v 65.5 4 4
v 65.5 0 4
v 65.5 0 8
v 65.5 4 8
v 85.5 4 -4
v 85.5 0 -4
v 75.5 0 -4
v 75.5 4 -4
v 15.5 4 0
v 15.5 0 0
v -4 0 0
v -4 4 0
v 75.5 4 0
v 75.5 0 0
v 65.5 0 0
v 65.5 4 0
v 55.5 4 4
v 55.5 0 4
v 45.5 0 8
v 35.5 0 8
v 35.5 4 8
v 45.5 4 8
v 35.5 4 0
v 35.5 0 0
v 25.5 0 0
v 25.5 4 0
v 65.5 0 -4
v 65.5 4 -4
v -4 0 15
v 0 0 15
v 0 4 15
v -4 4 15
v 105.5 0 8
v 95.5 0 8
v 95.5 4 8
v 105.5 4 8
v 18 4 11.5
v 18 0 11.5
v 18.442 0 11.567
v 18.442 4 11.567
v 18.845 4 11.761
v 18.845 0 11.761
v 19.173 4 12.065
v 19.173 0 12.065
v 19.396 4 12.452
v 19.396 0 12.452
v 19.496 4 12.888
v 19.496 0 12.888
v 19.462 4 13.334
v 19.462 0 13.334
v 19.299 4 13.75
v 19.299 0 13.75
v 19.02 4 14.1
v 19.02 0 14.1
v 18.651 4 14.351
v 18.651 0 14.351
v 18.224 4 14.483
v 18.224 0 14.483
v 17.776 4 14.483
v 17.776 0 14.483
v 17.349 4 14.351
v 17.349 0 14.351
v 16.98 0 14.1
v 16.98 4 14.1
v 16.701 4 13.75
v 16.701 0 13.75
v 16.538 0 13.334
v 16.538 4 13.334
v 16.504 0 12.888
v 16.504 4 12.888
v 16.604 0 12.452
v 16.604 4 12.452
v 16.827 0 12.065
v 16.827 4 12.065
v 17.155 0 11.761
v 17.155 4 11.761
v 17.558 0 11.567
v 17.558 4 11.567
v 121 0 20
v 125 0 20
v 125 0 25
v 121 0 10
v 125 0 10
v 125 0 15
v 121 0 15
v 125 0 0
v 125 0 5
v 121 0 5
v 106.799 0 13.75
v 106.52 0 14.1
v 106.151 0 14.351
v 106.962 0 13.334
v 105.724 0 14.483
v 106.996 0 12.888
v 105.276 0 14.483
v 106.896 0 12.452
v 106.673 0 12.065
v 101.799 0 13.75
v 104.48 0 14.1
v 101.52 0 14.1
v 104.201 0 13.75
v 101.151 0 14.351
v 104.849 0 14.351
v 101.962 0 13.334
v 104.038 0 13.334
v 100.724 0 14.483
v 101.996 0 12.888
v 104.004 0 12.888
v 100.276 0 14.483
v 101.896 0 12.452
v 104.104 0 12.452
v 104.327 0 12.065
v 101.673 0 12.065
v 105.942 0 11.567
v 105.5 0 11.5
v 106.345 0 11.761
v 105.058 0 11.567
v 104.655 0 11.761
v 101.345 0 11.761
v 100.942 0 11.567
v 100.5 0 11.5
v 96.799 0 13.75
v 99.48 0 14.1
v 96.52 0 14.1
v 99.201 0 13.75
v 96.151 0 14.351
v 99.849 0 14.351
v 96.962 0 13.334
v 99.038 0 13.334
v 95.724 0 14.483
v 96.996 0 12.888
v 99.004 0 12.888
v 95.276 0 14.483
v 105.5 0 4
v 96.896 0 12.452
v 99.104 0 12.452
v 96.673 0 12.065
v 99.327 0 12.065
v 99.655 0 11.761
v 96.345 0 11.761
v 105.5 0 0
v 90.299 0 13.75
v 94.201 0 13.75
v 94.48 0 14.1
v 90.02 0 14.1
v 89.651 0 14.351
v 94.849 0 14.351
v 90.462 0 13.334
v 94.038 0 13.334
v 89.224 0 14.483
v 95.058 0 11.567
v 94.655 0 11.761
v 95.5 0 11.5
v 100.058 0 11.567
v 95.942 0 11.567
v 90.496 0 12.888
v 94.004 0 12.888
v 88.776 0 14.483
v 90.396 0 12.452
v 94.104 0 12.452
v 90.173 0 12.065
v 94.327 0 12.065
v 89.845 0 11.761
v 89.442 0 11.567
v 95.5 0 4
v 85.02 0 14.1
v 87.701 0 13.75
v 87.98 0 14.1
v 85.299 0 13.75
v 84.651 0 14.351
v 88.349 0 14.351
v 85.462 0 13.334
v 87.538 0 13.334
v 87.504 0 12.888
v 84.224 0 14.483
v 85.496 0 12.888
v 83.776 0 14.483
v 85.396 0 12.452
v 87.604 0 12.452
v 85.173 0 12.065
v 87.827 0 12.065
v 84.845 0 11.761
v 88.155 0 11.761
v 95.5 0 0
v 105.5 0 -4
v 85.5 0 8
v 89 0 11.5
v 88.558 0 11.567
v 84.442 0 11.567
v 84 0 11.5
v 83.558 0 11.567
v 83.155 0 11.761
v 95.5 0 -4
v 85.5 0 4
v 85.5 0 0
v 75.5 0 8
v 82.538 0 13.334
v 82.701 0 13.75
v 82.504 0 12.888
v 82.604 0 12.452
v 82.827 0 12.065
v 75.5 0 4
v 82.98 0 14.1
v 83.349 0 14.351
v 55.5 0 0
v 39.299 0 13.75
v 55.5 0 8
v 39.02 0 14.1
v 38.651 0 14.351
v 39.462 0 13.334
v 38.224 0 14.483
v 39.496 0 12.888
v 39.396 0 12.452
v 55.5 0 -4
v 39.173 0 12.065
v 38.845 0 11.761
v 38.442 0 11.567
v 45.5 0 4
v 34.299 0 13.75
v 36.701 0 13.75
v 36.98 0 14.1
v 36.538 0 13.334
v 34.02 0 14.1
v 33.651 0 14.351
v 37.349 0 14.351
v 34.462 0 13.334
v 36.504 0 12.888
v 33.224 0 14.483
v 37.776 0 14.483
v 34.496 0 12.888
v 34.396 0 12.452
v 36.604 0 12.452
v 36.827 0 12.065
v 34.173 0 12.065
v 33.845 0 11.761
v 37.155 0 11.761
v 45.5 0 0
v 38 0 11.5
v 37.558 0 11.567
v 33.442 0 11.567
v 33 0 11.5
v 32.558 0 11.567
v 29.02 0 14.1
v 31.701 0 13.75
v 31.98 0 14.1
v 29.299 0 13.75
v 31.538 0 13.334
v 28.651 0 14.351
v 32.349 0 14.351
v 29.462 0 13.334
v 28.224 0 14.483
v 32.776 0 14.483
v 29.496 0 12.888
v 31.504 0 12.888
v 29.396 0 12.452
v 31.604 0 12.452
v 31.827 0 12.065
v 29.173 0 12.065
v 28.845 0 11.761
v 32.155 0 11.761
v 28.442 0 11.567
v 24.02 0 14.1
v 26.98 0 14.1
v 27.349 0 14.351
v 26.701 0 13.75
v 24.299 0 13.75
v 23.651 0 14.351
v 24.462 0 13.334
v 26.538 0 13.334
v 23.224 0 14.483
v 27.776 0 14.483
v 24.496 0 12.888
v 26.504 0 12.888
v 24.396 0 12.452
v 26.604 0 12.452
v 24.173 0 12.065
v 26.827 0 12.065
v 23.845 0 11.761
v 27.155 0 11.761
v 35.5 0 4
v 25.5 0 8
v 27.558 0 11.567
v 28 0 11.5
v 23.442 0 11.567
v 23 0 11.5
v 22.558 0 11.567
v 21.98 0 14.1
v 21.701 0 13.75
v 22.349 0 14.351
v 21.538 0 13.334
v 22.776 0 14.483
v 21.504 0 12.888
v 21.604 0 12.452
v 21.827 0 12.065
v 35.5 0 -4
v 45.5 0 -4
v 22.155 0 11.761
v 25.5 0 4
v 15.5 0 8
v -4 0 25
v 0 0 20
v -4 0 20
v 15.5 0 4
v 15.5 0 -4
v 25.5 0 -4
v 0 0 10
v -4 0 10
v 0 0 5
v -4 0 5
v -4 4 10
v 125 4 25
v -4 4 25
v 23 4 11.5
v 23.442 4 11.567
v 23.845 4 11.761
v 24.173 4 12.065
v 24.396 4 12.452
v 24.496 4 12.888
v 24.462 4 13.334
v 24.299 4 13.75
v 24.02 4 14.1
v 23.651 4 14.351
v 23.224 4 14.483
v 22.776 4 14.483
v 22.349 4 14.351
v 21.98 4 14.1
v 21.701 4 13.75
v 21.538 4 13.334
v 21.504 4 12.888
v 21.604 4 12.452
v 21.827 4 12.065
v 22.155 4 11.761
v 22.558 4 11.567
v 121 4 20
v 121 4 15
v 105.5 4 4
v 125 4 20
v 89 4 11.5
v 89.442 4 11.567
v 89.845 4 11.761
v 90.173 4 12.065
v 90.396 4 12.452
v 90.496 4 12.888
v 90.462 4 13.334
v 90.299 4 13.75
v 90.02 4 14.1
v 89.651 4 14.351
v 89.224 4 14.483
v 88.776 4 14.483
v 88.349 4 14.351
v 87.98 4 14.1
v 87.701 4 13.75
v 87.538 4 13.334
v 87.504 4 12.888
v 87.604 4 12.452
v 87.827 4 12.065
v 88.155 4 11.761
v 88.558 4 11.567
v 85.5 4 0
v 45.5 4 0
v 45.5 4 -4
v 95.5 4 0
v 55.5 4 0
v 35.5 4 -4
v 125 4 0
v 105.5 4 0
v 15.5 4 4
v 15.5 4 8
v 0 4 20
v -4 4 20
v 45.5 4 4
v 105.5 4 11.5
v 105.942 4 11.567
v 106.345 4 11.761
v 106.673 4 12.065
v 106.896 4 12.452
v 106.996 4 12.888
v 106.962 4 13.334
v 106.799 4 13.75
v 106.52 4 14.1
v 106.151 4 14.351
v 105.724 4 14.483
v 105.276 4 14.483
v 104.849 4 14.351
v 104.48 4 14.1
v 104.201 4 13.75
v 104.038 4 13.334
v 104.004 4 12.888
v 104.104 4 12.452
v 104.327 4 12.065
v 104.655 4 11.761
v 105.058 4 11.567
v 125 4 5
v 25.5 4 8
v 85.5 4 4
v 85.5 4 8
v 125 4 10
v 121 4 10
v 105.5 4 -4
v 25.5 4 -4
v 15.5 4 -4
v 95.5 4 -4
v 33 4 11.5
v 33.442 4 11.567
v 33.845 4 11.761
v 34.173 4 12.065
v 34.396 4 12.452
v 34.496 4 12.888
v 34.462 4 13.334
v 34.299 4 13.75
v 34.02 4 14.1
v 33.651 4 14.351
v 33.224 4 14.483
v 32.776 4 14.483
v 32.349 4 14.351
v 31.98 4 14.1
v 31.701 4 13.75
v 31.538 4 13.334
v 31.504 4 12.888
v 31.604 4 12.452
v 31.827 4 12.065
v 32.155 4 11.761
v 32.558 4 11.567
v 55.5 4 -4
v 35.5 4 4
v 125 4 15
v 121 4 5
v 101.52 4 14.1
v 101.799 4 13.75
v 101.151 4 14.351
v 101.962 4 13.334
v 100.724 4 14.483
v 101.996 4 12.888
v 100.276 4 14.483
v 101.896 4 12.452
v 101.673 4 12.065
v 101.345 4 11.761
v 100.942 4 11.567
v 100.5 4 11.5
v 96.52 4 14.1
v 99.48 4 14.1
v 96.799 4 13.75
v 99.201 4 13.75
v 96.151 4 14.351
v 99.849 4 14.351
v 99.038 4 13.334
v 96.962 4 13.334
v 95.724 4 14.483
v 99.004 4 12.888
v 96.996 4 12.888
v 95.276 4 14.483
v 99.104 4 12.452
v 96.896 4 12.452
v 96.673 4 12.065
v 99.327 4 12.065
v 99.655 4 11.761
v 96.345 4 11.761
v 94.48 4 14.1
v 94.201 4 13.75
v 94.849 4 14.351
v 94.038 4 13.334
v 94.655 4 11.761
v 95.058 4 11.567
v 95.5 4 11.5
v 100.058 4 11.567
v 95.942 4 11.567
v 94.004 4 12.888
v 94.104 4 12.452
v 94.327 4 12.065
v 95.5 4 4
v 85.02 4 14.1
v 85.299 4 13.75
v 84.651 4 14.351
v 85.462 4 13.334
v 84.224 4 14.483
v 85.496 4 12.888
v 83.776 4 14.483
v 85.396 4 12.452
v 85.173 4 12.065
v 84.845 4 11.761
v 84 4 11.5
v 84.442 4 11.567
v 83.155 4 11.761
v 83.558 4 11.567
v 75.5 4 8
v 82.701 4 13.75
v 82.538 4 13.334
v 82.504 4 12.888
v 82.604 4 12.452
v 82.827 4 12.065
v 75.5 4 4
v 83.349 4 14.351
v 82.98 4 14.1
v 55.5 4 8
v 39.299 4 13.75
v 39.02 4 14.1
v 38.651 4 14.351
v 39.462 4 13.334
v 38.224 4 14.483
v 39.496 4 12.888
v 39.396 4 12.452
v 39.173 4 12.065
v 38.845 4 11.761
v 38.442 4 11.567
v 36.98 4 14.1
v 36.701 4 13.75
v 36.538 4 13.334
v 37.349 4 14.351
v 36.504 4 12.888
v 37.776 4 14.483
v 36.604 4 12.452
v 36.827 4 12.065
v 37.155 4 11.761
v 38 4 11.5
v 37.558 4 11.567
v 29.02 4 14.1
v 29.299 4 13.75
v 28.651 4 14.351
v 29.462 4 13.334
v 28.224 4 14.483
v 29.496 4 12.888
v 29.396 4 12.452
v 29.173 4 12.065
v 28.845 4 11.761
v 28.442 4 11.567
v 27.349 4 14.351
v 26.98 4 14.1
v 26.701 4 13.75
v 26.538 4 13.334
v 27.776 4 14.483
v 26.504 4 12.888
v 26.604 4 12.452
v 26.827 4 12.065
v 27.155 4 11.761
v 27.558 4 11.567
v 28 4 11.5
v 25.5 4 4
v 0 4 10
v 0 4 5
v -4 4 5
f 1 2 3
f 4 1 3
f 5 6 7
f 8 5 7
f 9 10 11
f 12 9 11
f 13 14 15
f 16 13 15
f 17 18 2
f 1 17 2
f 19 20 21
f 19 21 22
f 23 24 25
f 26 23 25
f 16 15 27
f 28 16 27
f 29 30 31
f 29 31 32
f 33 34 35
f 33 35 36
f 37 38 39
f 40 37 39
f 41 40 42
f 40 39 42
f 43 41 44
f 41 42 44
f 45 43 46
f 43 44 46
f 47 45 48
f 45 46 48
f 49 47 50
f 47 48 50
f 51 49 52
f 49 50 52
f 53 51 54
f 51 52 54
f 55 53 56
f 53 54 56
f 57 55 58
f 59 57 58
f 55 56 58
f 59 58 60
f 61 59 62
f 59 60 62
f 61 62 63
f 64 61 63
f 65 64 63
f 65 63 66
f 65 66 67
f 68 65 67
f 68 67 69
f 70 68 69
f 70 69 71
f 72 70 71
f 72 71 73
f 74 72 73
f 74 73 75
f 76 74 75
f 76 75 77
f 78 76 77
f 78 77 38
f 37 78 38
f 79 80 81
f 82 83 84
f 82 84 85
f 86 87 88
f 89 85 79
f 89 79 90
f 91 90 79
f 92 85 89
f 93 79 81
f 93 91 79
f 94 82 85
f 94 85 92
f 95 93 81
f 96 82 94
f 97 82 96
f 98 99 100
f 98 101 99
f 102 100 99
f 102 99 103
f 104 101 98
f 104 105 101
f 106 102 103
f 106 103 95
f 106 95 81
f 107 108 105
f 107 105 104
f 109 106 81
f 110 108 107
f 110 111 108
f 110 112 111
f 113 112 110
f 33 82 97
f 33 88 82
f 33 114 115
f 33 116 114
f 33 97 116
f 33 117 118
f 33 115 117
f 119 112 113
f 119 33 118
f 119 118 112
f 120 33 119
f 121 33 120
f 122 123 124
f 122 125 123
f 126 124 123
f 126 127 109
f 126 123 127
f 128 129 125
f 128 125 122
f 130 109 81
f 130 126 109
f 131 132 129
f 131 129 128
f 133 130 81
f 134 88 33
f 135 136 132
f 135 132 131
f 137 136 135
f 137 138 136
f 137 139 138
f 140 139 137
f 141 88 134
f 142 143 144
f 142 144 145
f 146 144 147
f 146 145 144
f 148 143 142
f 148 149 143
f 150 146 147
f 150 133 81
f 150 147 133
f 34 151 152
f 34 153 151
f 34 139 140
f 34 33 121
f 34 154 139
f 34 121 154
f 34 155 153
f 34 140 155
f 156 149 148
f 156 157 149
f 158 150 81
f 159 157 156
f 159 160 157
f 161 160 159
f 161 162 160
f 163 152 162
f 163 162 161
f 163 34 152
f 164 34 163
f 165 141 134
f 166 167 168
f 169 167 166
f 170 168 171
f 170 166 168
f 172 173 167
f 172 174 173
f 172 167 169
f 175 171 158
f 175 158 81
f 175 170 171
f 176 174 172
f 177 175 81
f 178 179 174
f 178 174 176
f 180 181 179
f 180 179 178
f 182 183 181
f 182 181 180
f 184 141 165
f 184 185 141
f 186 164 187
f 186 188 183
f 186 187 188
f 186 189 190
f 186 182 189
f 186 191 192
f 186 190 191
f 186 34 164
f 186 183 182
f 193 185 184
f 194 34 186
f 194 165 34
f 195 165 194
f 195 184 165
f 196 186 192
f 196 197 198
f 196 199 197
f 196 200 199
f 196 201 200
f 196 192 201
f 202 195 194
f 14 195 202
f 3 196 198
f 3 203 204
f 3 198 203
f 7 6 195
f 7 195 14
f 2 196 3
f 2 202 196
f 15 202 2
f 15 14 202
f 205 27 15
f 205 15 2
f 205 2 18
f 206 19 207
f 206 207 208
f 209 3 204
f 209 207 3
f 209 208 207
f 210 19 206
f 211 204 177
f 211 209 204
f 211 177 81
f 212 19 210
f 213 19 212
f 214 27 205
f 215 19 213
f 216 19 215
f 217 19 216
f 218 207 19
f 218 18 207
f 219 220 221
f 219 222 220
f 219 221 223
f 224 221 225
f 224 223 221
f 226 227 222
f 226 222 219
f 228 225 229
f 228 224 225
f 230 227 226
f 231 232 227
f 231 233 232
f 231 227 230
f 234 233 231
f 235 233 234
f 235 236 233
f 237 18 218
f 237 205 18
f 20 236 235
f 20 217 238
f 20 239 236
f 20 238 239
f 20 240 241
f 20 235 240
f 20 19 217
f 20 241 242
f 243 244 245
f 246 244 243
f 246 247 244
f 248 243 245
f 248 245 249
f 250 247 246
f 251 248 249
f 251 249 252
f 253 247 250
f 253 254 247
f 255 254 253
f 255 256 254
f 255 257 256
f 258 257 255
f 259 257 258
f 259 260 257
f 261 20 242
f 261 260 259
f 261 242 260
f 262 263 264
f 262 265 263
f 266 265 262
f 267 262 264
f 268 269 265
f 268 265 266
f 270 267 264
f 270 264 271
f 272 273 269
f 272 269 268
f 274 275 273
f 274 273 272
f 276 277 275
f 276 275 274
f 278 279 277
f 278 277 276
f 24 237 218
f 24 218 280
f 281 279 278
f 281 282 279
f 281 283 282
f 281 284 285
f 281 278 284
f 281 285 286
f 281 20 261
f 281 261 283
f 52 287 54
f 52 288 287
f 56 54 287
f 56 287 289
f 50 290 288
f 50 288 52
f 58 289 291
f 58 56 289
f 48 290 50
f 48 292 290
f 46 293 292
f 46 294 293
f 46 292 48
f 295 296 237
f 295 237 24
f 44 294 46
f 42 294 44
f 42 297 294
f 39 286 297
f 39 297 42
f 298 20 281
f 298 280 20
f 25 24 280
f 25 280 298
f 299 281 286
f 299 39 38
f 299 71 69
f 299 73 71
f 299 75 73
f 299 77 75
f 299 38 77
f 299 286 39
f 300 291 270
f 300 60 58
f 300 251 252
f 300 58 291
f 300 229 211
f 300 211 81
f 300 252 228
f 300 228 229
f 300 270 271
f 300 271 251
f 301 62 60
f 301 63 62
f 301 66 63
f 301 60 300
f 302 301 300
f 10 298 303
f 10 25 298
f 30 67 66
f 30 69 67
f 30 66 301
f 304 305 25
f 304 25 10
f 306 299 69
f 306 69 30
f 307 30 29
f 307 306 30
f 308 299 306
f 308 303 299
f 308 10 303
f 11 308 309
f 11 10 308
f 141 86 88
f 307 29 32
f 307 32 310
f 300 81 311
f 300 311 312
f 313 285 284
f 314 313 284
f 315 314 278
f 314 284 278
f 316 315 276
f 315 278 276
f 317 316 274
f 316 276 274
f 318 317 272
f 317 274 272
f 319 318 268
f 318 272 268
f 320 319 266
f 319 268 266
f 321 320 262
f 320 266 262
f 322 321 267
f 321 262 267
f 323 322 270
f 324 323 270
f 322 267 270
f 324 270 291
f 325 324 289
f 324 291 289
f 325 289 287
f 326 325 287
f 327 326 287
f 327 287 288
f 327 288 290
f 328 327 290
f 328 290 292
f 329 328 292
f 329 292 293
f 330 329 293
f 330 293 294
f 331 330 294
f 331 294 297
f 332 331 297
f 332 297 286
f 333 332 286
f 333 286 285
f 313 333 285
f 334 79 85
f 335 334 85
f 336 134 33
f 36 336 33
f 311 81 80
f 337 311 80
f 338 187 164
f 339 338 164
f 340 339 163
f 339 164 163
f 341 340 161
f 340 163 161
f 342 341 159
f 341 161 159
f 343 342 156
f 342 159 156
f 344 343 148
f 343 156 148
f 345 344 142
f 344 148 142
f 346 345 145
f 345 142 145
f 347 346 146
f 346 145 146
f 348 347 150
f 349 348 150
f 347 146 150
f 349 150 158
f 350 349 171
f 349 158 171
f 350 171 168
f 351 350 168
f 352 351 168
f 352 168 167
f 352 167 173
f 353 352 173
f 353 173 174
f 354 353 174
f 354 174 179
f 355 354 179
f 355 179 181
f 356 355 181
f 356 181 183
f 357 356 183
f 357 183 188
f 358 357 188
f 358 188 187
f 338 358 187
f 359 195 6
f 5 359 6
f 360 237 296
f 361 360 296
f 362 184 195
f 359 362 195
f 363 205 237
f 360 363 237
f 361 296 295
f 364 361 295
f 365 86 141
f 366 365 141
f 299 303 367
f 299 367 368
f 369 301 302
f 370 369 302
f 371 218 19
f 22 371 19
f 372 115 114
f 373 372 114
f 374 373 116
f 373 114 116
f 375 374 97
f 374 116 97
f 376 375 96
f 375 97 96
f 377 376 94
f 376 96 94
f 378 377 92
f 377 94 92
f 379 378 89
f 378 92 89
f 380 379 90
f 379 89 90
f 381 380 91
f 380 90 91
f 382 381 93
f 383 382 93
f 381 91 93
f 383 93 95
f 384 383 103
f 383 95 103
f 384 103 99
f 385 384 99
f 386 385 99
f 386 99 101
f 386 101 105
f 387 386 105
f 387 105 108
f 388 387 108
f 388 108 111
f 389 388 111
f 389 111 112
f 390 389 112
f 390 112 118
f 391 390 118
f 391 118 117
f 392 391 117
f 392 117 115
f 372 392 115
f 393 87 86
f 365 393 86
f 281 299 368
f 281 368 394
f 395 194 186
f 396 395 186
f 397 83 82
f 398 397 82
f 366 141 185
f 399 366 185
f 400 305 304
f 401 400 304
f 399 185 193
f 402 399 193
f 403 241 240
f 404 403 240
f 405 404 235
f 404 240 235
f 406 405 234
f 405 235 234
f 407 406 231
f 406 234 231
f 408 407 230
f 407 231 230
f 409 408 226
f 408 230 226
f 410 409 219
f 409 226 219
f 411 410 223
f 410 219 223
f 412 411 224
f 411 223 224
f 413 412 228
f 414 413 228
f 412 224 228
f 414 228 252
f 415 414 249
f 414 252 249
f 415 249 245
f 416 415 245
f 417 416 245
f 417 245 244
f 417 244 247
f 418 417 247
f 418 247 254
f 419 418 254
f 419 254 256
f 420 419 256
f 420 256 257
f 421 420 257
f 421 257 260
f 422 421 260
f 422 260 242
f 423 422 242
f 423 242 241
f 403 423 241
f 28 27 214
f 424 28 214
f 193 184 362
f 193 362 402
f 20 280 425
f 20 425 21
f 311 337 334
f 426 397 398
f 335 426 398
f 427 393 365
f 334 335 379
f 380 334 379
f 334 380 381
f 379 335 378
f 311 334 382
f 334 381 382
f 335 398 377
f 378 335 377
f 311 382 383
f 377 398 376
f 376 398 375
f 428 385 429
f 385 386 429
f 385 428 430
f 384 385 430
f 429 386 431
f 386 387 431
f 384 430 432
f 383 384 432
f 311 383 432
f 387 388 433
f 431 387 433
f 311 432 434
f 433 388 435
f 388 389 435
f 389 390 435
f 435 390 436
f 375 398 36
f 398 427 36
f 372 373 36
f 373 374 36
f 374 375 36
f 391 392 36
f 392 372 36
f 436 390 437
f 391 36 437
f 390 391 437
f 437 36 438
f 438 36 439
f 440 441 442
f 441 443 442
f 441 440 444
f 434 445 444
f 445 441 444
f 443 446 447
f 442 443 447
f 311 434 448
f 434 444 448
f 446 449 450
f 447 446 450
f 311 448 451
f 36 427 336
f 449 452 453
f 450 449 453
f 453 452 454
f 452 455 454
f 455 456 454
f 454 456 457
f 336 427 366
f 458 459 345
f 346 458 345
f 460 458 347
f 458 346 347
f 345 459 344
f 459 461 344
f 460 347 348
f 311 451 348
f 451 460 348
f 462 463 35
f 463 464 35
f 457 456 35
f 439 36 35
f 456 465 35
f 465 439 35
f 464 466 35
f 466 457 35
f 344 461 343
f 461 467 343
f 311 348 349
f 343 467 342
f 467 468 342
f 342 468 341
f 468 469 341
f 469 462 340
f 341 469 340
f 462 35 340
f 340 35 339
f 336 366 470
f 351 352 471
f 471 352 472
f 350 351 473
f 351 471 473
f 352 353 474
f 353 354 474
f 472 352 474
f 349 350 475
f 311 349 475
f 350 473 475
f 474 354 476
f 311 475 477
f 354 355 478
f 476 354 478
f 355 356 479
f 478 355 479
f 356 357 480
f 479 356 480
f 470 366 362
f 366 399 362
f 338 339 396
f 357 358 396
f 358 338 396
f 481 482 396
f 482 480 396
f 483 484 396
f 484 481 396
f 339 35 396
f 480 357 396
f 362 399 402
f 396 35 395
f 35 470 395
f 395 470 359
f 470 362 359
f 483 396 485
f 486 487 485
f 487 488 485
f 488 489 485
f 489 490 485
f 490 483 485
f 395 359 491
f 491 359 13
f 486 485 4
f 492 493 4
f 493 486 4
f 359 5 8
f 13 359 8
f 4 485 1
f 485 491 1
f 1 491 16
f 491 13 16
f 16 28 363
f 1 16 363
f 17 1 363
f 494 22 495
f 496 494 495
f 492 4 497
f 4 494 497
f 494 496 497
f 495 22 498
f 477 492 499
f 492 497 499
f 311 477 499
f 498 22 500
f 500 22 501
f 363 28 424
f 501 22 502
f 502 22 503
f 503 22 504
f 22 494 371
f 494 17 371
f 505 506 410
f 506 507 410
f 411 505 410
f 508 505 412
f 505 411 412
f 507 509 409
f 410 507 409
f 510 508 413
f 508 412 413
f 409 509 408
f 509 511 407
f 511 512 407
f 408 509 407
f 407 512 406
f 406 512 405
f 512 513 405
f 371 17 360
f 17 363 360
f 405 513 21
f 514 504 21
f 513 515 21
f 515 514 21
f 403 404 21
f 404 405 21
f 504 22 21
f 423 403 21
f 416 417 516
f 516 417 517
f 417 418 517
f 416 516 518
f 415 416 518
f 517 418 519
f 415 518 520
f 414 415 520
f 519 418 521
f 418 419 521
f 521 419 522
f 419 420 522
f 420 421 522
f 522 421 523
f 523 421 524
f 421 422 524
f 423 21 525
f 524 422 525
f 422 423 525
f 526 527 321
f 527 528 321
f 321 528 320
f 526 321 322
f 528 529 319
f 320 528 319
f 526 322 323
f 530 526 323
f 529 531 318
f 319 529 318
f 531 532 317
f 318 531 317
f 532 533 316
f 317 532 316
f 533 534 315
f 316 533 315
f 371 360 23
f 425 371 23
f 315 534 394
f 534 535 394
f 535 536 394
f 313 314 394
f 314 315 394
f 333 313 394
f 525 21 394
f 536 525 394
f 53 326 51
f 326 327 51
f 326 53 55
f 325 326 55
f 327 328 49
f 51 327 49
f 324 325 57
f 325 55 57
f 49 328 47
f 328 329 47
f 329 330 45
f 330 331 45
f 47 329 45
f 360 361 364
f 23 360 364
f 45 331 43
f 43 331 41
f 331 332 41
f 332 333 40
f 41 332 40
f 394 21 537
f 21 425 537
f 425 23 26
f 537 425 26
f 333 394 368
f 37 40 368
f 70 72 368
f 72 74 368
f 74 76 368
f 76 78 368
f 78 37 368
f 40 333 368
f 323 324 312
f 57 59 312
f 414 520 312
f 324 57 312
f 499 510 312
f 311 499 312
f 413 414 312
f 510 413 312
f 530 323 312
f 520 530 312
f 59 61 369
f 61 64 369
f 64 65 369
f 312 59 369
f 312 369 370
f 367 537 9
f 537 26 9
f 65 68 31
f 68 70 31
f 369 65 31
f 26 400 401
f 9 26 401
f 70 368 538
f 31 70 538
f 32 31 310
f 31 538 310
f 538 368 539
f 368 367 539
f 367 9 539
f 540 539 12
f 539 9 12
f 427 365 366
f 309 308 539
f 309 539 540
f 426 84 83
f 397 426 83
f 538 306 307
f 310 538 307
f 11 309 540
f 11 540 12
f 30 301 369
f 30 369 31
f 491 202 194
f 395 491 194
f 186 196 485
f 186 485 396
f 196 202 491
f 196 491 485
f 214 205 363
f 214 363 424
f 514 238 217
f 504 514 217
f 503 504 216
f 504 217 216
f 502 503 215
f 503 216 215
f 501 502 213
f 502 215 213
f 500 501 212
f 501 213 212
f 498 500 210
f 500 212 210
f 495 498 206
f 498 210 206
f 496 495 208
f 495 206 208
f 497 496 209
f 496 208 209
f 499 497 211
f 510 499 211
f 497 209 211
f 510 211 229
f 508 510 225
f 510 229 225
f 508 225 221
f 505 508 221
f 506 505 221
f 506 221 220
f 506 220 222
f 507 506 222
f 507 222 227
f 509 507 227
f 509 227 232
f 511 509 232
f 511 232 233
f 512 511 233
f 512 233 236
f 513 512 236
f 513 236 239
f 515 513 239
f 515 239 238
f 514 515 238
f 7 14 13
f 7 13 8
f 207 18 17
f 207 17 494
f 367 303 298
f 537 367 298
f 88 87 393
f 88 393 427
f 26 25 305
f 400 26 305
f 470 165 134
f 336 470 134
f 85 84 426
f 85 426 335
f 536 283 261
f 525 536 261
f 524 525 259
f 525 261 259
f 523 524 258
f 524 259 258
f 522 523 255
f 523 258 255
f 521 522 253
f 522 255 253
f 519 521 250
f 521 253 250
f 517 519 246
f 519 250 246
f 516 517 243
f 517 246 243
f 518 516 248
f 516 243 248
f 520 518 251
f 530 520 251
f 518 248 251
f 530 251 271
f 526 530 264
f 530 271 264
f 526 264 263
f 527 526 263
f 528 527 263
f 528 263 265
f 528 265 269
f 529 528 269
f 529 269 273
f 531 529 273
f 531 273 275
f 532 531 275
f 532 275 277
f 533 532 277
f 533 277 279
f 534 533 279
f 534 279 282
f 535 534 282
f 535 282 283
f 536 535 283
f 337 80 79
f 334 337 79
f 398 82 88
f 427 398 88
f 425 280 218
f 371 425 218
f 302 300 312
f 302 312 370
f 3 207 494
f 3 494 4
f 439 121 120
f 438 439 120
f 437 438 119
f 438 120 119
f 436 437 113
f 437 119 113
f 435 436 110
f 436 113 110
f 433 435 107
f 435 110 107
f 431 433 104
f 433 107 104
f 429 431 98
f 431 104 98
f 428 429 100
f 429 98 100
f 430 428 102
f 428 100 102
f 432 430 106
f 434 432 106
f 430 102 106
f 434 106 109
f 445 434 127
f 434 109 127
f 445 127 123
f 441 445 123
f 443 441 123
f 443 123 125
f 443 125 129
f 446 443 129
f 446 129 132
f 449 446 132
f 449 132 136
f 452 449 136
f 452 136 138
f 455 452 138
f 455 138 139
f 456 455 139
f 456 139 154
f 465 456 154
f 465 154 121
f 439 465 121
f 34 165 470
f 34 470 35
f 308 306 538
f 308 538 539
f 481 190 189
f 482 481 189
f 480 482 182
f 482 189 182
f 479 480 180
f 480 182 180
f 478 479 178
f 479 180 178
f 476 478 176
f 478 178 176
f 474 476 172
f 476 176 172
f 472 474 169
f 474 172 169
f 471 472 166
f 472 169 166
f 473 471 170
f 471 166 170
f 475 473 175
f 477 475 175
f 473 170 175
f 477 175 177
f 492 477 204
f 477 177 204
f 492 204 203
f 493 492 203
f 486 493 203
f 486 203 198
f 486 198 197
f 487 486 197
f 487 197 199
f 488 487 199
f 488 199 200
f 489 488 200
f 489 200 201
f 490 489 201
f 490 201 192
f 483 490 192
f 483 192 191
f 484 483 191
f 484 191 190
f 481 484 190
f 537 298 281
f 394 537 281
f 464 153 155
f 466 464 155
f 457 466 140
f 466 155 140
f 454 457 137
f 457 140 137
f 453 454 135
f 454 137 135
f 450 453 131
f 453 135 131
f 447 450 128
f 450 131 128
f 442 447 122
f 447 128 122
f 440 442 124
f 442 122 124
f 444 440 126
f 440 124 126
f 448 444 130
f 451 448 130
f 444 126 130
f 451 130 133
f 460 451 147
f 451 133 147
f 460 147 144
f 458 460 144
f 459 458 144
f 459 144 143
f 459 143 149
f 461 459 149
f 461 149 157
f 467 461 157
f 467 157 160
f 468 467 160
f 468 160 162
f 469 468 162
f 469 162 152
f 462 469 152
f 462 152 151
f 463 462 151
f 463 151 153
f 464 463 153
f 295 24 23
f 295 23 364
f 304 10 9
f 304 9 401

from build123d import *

# Parameters (mm, degrees)
SKETCH1_W           = 121
SKETCH1_H           = 25
BOSS_EXTRUDE1_DEPTH = 4
SKETCH2_W           = 4
SKETCH2_H           = 5
BOSS_EXTRUDE2_DEPTH = 4
LPATTERN1_COUNT     = 3
LPATTERN1_PITCH     = 10
SKETCH3_W           = 10
SKETCH3_H           = 4
BOSS_EXTRUDE3_DEPTH = 4
LPATTERN2_COUNT     = 3
LPATTERN2_PITCH     = 20
LPATTERN2_COL_COUNT = 3
LPATTERN2_COL_PITCH = 20
SKETCH4_W           = 10
SKETCH4_H           = 4
CUT_EXTRUDE1_DEPTH  = 128.538229563
SKETCH6_R           = 1.5
CUT_EXTRUDE3_DEPTH  = 128.538229563


with BuildPart() as part:
    # Sketch1 → Boss-Extrude1 (new body)
    with BuildSketch(Plane(origin=(0, 0, 0), x_dir=(1, 0, 0), z_dir=(0, 1, 0))):
        with Locations((60.5, -12.5)):
            Rectangle(SKETCH1_W, SKETCH1_H)
    extrude(amount=BOSS_EXTRUDE1_DEPTH)

    # Sketch2 → Boss-Extrude2 (add, through all)
    with BuildSketch(Plane(origin=(0, 0, 0), x_dir=(-1, 0, 0), z_dir=(0, -1, 0))):
        with Locations((2, -22.5)):
            Rectangle(SKETCH2_W, SKETCH2_H)
        with Locations((-123, -22.5)):
            Rectangle(SKETCH2_W, SKETCH2_H)
    boss_extrude2 = extrude(amount=-BOSS_EXTRUDE2_DEPTH)

    # LPattern1: Boss-Extrude2 ×3
    with Locations(*[(0, 0, -i * LPATTERN1_PITCH) for i in range(1, LPATTERN1_COUNT)]):
        add(boss_extrude2)

    # Sketch3 → Boss-Extrude3 (add, through all)
    with BuildSketch(Plane(origin=(0, 0, 0), x_dir=(-1, 0, 0), z_dir=(0, -1, 0))):
        with Locations((-60.5, 2)):
            Rectangle(SKETCH3_W, SKETCH3_H)
    boss_extrude3 = extrude(amount=-BOSS_EXTRUDE3_DEPTH)

    # LPattern2: Boss-Extrude3 ×3
    with Locations(*[(i * LPATTERN2_PITCH, 0, 0) for i in range(1, LPATTERN2_COUNT)]):
        add(boss_extrude3)

    # LPattern2 col: Boss-Extrude3 ×3
    with Locations(*[(-i * LPATTERN2_COL_PITCH, 0, 0) for i in range(1, LPATTERN2_COL_COUNT)]):
        add(boss_extrude3)

    # Sketch4 → Cut-Extrude1 (cut, through all)
    with BuildSketch(Plane.XZ):
        with Locations((20.5, 6)):
            Rectangle(SKETCH4_W, SKETCH4_H)
        with Locations((40.5, 6)):
            Rectangle(SKETCH4_W, SKETCH4_H)
        with Locations((60.5, 6)):
            Rectangle(SKETCH4_W, SKETCH4_H)
        with Locations((80.5, 6)):
            Rectangle(SKETCH4_W, SKETCH4_H)
        with Locations((100.5, 6)):
            Rectangle(SKETCH4_W, SKETCH4_H)
    extrude(amount=-CUT_EXTRUDE1_DEPTH, mode=Mode.SUBTRACT)

    # Sketch6 → Cut-Extrude3 (cut, through all)
    with BuildSketch(Plane.XZ):
        with Locations(Location((38, 13, 0), (0, 0, 270))):
            Circle(SKETCH6_R)
        with Locations(Location((33, 13, 0), (0, 0, 270))):
            Circle(SKETCH6_R)
        with Locations(Location((28, 13, 0), (0, 0, 270))):
            Circle(SKETCH6_R)
        with Locations(Location((23, 13, 0), (0, 0, 270))):
            Circle(SKETCH6_R)
        with Locations(Location((18, 13, 0), (0, 0, 270))):
            Circle(SKETCH6_R)
        with Locations(Location((84, 13, 0), (0, 0, 270))):
            Circle(SKETCH6_R)
        with Locations(Location((89, 13, 0), (0, 0, 270))):
            Circle(SKETCH6_R)
        with Locations(Location((95.5, 13, 0), (0, 0, 270))):
            Circle(SKETCH6_R)
        with Locations(Location((100.5, 13, 0), (0, 0, 270))):
            Circle(SKETCH6_R)
        with Locations(Location((105.5, 13, 0), (0, 0, 270))):
            Circle(SKETCH6_R)
    extrude(amount=-CUT_EXTRUDE3_DEPTH, mode=Mode.SUBTRACT)


solid = part.part
